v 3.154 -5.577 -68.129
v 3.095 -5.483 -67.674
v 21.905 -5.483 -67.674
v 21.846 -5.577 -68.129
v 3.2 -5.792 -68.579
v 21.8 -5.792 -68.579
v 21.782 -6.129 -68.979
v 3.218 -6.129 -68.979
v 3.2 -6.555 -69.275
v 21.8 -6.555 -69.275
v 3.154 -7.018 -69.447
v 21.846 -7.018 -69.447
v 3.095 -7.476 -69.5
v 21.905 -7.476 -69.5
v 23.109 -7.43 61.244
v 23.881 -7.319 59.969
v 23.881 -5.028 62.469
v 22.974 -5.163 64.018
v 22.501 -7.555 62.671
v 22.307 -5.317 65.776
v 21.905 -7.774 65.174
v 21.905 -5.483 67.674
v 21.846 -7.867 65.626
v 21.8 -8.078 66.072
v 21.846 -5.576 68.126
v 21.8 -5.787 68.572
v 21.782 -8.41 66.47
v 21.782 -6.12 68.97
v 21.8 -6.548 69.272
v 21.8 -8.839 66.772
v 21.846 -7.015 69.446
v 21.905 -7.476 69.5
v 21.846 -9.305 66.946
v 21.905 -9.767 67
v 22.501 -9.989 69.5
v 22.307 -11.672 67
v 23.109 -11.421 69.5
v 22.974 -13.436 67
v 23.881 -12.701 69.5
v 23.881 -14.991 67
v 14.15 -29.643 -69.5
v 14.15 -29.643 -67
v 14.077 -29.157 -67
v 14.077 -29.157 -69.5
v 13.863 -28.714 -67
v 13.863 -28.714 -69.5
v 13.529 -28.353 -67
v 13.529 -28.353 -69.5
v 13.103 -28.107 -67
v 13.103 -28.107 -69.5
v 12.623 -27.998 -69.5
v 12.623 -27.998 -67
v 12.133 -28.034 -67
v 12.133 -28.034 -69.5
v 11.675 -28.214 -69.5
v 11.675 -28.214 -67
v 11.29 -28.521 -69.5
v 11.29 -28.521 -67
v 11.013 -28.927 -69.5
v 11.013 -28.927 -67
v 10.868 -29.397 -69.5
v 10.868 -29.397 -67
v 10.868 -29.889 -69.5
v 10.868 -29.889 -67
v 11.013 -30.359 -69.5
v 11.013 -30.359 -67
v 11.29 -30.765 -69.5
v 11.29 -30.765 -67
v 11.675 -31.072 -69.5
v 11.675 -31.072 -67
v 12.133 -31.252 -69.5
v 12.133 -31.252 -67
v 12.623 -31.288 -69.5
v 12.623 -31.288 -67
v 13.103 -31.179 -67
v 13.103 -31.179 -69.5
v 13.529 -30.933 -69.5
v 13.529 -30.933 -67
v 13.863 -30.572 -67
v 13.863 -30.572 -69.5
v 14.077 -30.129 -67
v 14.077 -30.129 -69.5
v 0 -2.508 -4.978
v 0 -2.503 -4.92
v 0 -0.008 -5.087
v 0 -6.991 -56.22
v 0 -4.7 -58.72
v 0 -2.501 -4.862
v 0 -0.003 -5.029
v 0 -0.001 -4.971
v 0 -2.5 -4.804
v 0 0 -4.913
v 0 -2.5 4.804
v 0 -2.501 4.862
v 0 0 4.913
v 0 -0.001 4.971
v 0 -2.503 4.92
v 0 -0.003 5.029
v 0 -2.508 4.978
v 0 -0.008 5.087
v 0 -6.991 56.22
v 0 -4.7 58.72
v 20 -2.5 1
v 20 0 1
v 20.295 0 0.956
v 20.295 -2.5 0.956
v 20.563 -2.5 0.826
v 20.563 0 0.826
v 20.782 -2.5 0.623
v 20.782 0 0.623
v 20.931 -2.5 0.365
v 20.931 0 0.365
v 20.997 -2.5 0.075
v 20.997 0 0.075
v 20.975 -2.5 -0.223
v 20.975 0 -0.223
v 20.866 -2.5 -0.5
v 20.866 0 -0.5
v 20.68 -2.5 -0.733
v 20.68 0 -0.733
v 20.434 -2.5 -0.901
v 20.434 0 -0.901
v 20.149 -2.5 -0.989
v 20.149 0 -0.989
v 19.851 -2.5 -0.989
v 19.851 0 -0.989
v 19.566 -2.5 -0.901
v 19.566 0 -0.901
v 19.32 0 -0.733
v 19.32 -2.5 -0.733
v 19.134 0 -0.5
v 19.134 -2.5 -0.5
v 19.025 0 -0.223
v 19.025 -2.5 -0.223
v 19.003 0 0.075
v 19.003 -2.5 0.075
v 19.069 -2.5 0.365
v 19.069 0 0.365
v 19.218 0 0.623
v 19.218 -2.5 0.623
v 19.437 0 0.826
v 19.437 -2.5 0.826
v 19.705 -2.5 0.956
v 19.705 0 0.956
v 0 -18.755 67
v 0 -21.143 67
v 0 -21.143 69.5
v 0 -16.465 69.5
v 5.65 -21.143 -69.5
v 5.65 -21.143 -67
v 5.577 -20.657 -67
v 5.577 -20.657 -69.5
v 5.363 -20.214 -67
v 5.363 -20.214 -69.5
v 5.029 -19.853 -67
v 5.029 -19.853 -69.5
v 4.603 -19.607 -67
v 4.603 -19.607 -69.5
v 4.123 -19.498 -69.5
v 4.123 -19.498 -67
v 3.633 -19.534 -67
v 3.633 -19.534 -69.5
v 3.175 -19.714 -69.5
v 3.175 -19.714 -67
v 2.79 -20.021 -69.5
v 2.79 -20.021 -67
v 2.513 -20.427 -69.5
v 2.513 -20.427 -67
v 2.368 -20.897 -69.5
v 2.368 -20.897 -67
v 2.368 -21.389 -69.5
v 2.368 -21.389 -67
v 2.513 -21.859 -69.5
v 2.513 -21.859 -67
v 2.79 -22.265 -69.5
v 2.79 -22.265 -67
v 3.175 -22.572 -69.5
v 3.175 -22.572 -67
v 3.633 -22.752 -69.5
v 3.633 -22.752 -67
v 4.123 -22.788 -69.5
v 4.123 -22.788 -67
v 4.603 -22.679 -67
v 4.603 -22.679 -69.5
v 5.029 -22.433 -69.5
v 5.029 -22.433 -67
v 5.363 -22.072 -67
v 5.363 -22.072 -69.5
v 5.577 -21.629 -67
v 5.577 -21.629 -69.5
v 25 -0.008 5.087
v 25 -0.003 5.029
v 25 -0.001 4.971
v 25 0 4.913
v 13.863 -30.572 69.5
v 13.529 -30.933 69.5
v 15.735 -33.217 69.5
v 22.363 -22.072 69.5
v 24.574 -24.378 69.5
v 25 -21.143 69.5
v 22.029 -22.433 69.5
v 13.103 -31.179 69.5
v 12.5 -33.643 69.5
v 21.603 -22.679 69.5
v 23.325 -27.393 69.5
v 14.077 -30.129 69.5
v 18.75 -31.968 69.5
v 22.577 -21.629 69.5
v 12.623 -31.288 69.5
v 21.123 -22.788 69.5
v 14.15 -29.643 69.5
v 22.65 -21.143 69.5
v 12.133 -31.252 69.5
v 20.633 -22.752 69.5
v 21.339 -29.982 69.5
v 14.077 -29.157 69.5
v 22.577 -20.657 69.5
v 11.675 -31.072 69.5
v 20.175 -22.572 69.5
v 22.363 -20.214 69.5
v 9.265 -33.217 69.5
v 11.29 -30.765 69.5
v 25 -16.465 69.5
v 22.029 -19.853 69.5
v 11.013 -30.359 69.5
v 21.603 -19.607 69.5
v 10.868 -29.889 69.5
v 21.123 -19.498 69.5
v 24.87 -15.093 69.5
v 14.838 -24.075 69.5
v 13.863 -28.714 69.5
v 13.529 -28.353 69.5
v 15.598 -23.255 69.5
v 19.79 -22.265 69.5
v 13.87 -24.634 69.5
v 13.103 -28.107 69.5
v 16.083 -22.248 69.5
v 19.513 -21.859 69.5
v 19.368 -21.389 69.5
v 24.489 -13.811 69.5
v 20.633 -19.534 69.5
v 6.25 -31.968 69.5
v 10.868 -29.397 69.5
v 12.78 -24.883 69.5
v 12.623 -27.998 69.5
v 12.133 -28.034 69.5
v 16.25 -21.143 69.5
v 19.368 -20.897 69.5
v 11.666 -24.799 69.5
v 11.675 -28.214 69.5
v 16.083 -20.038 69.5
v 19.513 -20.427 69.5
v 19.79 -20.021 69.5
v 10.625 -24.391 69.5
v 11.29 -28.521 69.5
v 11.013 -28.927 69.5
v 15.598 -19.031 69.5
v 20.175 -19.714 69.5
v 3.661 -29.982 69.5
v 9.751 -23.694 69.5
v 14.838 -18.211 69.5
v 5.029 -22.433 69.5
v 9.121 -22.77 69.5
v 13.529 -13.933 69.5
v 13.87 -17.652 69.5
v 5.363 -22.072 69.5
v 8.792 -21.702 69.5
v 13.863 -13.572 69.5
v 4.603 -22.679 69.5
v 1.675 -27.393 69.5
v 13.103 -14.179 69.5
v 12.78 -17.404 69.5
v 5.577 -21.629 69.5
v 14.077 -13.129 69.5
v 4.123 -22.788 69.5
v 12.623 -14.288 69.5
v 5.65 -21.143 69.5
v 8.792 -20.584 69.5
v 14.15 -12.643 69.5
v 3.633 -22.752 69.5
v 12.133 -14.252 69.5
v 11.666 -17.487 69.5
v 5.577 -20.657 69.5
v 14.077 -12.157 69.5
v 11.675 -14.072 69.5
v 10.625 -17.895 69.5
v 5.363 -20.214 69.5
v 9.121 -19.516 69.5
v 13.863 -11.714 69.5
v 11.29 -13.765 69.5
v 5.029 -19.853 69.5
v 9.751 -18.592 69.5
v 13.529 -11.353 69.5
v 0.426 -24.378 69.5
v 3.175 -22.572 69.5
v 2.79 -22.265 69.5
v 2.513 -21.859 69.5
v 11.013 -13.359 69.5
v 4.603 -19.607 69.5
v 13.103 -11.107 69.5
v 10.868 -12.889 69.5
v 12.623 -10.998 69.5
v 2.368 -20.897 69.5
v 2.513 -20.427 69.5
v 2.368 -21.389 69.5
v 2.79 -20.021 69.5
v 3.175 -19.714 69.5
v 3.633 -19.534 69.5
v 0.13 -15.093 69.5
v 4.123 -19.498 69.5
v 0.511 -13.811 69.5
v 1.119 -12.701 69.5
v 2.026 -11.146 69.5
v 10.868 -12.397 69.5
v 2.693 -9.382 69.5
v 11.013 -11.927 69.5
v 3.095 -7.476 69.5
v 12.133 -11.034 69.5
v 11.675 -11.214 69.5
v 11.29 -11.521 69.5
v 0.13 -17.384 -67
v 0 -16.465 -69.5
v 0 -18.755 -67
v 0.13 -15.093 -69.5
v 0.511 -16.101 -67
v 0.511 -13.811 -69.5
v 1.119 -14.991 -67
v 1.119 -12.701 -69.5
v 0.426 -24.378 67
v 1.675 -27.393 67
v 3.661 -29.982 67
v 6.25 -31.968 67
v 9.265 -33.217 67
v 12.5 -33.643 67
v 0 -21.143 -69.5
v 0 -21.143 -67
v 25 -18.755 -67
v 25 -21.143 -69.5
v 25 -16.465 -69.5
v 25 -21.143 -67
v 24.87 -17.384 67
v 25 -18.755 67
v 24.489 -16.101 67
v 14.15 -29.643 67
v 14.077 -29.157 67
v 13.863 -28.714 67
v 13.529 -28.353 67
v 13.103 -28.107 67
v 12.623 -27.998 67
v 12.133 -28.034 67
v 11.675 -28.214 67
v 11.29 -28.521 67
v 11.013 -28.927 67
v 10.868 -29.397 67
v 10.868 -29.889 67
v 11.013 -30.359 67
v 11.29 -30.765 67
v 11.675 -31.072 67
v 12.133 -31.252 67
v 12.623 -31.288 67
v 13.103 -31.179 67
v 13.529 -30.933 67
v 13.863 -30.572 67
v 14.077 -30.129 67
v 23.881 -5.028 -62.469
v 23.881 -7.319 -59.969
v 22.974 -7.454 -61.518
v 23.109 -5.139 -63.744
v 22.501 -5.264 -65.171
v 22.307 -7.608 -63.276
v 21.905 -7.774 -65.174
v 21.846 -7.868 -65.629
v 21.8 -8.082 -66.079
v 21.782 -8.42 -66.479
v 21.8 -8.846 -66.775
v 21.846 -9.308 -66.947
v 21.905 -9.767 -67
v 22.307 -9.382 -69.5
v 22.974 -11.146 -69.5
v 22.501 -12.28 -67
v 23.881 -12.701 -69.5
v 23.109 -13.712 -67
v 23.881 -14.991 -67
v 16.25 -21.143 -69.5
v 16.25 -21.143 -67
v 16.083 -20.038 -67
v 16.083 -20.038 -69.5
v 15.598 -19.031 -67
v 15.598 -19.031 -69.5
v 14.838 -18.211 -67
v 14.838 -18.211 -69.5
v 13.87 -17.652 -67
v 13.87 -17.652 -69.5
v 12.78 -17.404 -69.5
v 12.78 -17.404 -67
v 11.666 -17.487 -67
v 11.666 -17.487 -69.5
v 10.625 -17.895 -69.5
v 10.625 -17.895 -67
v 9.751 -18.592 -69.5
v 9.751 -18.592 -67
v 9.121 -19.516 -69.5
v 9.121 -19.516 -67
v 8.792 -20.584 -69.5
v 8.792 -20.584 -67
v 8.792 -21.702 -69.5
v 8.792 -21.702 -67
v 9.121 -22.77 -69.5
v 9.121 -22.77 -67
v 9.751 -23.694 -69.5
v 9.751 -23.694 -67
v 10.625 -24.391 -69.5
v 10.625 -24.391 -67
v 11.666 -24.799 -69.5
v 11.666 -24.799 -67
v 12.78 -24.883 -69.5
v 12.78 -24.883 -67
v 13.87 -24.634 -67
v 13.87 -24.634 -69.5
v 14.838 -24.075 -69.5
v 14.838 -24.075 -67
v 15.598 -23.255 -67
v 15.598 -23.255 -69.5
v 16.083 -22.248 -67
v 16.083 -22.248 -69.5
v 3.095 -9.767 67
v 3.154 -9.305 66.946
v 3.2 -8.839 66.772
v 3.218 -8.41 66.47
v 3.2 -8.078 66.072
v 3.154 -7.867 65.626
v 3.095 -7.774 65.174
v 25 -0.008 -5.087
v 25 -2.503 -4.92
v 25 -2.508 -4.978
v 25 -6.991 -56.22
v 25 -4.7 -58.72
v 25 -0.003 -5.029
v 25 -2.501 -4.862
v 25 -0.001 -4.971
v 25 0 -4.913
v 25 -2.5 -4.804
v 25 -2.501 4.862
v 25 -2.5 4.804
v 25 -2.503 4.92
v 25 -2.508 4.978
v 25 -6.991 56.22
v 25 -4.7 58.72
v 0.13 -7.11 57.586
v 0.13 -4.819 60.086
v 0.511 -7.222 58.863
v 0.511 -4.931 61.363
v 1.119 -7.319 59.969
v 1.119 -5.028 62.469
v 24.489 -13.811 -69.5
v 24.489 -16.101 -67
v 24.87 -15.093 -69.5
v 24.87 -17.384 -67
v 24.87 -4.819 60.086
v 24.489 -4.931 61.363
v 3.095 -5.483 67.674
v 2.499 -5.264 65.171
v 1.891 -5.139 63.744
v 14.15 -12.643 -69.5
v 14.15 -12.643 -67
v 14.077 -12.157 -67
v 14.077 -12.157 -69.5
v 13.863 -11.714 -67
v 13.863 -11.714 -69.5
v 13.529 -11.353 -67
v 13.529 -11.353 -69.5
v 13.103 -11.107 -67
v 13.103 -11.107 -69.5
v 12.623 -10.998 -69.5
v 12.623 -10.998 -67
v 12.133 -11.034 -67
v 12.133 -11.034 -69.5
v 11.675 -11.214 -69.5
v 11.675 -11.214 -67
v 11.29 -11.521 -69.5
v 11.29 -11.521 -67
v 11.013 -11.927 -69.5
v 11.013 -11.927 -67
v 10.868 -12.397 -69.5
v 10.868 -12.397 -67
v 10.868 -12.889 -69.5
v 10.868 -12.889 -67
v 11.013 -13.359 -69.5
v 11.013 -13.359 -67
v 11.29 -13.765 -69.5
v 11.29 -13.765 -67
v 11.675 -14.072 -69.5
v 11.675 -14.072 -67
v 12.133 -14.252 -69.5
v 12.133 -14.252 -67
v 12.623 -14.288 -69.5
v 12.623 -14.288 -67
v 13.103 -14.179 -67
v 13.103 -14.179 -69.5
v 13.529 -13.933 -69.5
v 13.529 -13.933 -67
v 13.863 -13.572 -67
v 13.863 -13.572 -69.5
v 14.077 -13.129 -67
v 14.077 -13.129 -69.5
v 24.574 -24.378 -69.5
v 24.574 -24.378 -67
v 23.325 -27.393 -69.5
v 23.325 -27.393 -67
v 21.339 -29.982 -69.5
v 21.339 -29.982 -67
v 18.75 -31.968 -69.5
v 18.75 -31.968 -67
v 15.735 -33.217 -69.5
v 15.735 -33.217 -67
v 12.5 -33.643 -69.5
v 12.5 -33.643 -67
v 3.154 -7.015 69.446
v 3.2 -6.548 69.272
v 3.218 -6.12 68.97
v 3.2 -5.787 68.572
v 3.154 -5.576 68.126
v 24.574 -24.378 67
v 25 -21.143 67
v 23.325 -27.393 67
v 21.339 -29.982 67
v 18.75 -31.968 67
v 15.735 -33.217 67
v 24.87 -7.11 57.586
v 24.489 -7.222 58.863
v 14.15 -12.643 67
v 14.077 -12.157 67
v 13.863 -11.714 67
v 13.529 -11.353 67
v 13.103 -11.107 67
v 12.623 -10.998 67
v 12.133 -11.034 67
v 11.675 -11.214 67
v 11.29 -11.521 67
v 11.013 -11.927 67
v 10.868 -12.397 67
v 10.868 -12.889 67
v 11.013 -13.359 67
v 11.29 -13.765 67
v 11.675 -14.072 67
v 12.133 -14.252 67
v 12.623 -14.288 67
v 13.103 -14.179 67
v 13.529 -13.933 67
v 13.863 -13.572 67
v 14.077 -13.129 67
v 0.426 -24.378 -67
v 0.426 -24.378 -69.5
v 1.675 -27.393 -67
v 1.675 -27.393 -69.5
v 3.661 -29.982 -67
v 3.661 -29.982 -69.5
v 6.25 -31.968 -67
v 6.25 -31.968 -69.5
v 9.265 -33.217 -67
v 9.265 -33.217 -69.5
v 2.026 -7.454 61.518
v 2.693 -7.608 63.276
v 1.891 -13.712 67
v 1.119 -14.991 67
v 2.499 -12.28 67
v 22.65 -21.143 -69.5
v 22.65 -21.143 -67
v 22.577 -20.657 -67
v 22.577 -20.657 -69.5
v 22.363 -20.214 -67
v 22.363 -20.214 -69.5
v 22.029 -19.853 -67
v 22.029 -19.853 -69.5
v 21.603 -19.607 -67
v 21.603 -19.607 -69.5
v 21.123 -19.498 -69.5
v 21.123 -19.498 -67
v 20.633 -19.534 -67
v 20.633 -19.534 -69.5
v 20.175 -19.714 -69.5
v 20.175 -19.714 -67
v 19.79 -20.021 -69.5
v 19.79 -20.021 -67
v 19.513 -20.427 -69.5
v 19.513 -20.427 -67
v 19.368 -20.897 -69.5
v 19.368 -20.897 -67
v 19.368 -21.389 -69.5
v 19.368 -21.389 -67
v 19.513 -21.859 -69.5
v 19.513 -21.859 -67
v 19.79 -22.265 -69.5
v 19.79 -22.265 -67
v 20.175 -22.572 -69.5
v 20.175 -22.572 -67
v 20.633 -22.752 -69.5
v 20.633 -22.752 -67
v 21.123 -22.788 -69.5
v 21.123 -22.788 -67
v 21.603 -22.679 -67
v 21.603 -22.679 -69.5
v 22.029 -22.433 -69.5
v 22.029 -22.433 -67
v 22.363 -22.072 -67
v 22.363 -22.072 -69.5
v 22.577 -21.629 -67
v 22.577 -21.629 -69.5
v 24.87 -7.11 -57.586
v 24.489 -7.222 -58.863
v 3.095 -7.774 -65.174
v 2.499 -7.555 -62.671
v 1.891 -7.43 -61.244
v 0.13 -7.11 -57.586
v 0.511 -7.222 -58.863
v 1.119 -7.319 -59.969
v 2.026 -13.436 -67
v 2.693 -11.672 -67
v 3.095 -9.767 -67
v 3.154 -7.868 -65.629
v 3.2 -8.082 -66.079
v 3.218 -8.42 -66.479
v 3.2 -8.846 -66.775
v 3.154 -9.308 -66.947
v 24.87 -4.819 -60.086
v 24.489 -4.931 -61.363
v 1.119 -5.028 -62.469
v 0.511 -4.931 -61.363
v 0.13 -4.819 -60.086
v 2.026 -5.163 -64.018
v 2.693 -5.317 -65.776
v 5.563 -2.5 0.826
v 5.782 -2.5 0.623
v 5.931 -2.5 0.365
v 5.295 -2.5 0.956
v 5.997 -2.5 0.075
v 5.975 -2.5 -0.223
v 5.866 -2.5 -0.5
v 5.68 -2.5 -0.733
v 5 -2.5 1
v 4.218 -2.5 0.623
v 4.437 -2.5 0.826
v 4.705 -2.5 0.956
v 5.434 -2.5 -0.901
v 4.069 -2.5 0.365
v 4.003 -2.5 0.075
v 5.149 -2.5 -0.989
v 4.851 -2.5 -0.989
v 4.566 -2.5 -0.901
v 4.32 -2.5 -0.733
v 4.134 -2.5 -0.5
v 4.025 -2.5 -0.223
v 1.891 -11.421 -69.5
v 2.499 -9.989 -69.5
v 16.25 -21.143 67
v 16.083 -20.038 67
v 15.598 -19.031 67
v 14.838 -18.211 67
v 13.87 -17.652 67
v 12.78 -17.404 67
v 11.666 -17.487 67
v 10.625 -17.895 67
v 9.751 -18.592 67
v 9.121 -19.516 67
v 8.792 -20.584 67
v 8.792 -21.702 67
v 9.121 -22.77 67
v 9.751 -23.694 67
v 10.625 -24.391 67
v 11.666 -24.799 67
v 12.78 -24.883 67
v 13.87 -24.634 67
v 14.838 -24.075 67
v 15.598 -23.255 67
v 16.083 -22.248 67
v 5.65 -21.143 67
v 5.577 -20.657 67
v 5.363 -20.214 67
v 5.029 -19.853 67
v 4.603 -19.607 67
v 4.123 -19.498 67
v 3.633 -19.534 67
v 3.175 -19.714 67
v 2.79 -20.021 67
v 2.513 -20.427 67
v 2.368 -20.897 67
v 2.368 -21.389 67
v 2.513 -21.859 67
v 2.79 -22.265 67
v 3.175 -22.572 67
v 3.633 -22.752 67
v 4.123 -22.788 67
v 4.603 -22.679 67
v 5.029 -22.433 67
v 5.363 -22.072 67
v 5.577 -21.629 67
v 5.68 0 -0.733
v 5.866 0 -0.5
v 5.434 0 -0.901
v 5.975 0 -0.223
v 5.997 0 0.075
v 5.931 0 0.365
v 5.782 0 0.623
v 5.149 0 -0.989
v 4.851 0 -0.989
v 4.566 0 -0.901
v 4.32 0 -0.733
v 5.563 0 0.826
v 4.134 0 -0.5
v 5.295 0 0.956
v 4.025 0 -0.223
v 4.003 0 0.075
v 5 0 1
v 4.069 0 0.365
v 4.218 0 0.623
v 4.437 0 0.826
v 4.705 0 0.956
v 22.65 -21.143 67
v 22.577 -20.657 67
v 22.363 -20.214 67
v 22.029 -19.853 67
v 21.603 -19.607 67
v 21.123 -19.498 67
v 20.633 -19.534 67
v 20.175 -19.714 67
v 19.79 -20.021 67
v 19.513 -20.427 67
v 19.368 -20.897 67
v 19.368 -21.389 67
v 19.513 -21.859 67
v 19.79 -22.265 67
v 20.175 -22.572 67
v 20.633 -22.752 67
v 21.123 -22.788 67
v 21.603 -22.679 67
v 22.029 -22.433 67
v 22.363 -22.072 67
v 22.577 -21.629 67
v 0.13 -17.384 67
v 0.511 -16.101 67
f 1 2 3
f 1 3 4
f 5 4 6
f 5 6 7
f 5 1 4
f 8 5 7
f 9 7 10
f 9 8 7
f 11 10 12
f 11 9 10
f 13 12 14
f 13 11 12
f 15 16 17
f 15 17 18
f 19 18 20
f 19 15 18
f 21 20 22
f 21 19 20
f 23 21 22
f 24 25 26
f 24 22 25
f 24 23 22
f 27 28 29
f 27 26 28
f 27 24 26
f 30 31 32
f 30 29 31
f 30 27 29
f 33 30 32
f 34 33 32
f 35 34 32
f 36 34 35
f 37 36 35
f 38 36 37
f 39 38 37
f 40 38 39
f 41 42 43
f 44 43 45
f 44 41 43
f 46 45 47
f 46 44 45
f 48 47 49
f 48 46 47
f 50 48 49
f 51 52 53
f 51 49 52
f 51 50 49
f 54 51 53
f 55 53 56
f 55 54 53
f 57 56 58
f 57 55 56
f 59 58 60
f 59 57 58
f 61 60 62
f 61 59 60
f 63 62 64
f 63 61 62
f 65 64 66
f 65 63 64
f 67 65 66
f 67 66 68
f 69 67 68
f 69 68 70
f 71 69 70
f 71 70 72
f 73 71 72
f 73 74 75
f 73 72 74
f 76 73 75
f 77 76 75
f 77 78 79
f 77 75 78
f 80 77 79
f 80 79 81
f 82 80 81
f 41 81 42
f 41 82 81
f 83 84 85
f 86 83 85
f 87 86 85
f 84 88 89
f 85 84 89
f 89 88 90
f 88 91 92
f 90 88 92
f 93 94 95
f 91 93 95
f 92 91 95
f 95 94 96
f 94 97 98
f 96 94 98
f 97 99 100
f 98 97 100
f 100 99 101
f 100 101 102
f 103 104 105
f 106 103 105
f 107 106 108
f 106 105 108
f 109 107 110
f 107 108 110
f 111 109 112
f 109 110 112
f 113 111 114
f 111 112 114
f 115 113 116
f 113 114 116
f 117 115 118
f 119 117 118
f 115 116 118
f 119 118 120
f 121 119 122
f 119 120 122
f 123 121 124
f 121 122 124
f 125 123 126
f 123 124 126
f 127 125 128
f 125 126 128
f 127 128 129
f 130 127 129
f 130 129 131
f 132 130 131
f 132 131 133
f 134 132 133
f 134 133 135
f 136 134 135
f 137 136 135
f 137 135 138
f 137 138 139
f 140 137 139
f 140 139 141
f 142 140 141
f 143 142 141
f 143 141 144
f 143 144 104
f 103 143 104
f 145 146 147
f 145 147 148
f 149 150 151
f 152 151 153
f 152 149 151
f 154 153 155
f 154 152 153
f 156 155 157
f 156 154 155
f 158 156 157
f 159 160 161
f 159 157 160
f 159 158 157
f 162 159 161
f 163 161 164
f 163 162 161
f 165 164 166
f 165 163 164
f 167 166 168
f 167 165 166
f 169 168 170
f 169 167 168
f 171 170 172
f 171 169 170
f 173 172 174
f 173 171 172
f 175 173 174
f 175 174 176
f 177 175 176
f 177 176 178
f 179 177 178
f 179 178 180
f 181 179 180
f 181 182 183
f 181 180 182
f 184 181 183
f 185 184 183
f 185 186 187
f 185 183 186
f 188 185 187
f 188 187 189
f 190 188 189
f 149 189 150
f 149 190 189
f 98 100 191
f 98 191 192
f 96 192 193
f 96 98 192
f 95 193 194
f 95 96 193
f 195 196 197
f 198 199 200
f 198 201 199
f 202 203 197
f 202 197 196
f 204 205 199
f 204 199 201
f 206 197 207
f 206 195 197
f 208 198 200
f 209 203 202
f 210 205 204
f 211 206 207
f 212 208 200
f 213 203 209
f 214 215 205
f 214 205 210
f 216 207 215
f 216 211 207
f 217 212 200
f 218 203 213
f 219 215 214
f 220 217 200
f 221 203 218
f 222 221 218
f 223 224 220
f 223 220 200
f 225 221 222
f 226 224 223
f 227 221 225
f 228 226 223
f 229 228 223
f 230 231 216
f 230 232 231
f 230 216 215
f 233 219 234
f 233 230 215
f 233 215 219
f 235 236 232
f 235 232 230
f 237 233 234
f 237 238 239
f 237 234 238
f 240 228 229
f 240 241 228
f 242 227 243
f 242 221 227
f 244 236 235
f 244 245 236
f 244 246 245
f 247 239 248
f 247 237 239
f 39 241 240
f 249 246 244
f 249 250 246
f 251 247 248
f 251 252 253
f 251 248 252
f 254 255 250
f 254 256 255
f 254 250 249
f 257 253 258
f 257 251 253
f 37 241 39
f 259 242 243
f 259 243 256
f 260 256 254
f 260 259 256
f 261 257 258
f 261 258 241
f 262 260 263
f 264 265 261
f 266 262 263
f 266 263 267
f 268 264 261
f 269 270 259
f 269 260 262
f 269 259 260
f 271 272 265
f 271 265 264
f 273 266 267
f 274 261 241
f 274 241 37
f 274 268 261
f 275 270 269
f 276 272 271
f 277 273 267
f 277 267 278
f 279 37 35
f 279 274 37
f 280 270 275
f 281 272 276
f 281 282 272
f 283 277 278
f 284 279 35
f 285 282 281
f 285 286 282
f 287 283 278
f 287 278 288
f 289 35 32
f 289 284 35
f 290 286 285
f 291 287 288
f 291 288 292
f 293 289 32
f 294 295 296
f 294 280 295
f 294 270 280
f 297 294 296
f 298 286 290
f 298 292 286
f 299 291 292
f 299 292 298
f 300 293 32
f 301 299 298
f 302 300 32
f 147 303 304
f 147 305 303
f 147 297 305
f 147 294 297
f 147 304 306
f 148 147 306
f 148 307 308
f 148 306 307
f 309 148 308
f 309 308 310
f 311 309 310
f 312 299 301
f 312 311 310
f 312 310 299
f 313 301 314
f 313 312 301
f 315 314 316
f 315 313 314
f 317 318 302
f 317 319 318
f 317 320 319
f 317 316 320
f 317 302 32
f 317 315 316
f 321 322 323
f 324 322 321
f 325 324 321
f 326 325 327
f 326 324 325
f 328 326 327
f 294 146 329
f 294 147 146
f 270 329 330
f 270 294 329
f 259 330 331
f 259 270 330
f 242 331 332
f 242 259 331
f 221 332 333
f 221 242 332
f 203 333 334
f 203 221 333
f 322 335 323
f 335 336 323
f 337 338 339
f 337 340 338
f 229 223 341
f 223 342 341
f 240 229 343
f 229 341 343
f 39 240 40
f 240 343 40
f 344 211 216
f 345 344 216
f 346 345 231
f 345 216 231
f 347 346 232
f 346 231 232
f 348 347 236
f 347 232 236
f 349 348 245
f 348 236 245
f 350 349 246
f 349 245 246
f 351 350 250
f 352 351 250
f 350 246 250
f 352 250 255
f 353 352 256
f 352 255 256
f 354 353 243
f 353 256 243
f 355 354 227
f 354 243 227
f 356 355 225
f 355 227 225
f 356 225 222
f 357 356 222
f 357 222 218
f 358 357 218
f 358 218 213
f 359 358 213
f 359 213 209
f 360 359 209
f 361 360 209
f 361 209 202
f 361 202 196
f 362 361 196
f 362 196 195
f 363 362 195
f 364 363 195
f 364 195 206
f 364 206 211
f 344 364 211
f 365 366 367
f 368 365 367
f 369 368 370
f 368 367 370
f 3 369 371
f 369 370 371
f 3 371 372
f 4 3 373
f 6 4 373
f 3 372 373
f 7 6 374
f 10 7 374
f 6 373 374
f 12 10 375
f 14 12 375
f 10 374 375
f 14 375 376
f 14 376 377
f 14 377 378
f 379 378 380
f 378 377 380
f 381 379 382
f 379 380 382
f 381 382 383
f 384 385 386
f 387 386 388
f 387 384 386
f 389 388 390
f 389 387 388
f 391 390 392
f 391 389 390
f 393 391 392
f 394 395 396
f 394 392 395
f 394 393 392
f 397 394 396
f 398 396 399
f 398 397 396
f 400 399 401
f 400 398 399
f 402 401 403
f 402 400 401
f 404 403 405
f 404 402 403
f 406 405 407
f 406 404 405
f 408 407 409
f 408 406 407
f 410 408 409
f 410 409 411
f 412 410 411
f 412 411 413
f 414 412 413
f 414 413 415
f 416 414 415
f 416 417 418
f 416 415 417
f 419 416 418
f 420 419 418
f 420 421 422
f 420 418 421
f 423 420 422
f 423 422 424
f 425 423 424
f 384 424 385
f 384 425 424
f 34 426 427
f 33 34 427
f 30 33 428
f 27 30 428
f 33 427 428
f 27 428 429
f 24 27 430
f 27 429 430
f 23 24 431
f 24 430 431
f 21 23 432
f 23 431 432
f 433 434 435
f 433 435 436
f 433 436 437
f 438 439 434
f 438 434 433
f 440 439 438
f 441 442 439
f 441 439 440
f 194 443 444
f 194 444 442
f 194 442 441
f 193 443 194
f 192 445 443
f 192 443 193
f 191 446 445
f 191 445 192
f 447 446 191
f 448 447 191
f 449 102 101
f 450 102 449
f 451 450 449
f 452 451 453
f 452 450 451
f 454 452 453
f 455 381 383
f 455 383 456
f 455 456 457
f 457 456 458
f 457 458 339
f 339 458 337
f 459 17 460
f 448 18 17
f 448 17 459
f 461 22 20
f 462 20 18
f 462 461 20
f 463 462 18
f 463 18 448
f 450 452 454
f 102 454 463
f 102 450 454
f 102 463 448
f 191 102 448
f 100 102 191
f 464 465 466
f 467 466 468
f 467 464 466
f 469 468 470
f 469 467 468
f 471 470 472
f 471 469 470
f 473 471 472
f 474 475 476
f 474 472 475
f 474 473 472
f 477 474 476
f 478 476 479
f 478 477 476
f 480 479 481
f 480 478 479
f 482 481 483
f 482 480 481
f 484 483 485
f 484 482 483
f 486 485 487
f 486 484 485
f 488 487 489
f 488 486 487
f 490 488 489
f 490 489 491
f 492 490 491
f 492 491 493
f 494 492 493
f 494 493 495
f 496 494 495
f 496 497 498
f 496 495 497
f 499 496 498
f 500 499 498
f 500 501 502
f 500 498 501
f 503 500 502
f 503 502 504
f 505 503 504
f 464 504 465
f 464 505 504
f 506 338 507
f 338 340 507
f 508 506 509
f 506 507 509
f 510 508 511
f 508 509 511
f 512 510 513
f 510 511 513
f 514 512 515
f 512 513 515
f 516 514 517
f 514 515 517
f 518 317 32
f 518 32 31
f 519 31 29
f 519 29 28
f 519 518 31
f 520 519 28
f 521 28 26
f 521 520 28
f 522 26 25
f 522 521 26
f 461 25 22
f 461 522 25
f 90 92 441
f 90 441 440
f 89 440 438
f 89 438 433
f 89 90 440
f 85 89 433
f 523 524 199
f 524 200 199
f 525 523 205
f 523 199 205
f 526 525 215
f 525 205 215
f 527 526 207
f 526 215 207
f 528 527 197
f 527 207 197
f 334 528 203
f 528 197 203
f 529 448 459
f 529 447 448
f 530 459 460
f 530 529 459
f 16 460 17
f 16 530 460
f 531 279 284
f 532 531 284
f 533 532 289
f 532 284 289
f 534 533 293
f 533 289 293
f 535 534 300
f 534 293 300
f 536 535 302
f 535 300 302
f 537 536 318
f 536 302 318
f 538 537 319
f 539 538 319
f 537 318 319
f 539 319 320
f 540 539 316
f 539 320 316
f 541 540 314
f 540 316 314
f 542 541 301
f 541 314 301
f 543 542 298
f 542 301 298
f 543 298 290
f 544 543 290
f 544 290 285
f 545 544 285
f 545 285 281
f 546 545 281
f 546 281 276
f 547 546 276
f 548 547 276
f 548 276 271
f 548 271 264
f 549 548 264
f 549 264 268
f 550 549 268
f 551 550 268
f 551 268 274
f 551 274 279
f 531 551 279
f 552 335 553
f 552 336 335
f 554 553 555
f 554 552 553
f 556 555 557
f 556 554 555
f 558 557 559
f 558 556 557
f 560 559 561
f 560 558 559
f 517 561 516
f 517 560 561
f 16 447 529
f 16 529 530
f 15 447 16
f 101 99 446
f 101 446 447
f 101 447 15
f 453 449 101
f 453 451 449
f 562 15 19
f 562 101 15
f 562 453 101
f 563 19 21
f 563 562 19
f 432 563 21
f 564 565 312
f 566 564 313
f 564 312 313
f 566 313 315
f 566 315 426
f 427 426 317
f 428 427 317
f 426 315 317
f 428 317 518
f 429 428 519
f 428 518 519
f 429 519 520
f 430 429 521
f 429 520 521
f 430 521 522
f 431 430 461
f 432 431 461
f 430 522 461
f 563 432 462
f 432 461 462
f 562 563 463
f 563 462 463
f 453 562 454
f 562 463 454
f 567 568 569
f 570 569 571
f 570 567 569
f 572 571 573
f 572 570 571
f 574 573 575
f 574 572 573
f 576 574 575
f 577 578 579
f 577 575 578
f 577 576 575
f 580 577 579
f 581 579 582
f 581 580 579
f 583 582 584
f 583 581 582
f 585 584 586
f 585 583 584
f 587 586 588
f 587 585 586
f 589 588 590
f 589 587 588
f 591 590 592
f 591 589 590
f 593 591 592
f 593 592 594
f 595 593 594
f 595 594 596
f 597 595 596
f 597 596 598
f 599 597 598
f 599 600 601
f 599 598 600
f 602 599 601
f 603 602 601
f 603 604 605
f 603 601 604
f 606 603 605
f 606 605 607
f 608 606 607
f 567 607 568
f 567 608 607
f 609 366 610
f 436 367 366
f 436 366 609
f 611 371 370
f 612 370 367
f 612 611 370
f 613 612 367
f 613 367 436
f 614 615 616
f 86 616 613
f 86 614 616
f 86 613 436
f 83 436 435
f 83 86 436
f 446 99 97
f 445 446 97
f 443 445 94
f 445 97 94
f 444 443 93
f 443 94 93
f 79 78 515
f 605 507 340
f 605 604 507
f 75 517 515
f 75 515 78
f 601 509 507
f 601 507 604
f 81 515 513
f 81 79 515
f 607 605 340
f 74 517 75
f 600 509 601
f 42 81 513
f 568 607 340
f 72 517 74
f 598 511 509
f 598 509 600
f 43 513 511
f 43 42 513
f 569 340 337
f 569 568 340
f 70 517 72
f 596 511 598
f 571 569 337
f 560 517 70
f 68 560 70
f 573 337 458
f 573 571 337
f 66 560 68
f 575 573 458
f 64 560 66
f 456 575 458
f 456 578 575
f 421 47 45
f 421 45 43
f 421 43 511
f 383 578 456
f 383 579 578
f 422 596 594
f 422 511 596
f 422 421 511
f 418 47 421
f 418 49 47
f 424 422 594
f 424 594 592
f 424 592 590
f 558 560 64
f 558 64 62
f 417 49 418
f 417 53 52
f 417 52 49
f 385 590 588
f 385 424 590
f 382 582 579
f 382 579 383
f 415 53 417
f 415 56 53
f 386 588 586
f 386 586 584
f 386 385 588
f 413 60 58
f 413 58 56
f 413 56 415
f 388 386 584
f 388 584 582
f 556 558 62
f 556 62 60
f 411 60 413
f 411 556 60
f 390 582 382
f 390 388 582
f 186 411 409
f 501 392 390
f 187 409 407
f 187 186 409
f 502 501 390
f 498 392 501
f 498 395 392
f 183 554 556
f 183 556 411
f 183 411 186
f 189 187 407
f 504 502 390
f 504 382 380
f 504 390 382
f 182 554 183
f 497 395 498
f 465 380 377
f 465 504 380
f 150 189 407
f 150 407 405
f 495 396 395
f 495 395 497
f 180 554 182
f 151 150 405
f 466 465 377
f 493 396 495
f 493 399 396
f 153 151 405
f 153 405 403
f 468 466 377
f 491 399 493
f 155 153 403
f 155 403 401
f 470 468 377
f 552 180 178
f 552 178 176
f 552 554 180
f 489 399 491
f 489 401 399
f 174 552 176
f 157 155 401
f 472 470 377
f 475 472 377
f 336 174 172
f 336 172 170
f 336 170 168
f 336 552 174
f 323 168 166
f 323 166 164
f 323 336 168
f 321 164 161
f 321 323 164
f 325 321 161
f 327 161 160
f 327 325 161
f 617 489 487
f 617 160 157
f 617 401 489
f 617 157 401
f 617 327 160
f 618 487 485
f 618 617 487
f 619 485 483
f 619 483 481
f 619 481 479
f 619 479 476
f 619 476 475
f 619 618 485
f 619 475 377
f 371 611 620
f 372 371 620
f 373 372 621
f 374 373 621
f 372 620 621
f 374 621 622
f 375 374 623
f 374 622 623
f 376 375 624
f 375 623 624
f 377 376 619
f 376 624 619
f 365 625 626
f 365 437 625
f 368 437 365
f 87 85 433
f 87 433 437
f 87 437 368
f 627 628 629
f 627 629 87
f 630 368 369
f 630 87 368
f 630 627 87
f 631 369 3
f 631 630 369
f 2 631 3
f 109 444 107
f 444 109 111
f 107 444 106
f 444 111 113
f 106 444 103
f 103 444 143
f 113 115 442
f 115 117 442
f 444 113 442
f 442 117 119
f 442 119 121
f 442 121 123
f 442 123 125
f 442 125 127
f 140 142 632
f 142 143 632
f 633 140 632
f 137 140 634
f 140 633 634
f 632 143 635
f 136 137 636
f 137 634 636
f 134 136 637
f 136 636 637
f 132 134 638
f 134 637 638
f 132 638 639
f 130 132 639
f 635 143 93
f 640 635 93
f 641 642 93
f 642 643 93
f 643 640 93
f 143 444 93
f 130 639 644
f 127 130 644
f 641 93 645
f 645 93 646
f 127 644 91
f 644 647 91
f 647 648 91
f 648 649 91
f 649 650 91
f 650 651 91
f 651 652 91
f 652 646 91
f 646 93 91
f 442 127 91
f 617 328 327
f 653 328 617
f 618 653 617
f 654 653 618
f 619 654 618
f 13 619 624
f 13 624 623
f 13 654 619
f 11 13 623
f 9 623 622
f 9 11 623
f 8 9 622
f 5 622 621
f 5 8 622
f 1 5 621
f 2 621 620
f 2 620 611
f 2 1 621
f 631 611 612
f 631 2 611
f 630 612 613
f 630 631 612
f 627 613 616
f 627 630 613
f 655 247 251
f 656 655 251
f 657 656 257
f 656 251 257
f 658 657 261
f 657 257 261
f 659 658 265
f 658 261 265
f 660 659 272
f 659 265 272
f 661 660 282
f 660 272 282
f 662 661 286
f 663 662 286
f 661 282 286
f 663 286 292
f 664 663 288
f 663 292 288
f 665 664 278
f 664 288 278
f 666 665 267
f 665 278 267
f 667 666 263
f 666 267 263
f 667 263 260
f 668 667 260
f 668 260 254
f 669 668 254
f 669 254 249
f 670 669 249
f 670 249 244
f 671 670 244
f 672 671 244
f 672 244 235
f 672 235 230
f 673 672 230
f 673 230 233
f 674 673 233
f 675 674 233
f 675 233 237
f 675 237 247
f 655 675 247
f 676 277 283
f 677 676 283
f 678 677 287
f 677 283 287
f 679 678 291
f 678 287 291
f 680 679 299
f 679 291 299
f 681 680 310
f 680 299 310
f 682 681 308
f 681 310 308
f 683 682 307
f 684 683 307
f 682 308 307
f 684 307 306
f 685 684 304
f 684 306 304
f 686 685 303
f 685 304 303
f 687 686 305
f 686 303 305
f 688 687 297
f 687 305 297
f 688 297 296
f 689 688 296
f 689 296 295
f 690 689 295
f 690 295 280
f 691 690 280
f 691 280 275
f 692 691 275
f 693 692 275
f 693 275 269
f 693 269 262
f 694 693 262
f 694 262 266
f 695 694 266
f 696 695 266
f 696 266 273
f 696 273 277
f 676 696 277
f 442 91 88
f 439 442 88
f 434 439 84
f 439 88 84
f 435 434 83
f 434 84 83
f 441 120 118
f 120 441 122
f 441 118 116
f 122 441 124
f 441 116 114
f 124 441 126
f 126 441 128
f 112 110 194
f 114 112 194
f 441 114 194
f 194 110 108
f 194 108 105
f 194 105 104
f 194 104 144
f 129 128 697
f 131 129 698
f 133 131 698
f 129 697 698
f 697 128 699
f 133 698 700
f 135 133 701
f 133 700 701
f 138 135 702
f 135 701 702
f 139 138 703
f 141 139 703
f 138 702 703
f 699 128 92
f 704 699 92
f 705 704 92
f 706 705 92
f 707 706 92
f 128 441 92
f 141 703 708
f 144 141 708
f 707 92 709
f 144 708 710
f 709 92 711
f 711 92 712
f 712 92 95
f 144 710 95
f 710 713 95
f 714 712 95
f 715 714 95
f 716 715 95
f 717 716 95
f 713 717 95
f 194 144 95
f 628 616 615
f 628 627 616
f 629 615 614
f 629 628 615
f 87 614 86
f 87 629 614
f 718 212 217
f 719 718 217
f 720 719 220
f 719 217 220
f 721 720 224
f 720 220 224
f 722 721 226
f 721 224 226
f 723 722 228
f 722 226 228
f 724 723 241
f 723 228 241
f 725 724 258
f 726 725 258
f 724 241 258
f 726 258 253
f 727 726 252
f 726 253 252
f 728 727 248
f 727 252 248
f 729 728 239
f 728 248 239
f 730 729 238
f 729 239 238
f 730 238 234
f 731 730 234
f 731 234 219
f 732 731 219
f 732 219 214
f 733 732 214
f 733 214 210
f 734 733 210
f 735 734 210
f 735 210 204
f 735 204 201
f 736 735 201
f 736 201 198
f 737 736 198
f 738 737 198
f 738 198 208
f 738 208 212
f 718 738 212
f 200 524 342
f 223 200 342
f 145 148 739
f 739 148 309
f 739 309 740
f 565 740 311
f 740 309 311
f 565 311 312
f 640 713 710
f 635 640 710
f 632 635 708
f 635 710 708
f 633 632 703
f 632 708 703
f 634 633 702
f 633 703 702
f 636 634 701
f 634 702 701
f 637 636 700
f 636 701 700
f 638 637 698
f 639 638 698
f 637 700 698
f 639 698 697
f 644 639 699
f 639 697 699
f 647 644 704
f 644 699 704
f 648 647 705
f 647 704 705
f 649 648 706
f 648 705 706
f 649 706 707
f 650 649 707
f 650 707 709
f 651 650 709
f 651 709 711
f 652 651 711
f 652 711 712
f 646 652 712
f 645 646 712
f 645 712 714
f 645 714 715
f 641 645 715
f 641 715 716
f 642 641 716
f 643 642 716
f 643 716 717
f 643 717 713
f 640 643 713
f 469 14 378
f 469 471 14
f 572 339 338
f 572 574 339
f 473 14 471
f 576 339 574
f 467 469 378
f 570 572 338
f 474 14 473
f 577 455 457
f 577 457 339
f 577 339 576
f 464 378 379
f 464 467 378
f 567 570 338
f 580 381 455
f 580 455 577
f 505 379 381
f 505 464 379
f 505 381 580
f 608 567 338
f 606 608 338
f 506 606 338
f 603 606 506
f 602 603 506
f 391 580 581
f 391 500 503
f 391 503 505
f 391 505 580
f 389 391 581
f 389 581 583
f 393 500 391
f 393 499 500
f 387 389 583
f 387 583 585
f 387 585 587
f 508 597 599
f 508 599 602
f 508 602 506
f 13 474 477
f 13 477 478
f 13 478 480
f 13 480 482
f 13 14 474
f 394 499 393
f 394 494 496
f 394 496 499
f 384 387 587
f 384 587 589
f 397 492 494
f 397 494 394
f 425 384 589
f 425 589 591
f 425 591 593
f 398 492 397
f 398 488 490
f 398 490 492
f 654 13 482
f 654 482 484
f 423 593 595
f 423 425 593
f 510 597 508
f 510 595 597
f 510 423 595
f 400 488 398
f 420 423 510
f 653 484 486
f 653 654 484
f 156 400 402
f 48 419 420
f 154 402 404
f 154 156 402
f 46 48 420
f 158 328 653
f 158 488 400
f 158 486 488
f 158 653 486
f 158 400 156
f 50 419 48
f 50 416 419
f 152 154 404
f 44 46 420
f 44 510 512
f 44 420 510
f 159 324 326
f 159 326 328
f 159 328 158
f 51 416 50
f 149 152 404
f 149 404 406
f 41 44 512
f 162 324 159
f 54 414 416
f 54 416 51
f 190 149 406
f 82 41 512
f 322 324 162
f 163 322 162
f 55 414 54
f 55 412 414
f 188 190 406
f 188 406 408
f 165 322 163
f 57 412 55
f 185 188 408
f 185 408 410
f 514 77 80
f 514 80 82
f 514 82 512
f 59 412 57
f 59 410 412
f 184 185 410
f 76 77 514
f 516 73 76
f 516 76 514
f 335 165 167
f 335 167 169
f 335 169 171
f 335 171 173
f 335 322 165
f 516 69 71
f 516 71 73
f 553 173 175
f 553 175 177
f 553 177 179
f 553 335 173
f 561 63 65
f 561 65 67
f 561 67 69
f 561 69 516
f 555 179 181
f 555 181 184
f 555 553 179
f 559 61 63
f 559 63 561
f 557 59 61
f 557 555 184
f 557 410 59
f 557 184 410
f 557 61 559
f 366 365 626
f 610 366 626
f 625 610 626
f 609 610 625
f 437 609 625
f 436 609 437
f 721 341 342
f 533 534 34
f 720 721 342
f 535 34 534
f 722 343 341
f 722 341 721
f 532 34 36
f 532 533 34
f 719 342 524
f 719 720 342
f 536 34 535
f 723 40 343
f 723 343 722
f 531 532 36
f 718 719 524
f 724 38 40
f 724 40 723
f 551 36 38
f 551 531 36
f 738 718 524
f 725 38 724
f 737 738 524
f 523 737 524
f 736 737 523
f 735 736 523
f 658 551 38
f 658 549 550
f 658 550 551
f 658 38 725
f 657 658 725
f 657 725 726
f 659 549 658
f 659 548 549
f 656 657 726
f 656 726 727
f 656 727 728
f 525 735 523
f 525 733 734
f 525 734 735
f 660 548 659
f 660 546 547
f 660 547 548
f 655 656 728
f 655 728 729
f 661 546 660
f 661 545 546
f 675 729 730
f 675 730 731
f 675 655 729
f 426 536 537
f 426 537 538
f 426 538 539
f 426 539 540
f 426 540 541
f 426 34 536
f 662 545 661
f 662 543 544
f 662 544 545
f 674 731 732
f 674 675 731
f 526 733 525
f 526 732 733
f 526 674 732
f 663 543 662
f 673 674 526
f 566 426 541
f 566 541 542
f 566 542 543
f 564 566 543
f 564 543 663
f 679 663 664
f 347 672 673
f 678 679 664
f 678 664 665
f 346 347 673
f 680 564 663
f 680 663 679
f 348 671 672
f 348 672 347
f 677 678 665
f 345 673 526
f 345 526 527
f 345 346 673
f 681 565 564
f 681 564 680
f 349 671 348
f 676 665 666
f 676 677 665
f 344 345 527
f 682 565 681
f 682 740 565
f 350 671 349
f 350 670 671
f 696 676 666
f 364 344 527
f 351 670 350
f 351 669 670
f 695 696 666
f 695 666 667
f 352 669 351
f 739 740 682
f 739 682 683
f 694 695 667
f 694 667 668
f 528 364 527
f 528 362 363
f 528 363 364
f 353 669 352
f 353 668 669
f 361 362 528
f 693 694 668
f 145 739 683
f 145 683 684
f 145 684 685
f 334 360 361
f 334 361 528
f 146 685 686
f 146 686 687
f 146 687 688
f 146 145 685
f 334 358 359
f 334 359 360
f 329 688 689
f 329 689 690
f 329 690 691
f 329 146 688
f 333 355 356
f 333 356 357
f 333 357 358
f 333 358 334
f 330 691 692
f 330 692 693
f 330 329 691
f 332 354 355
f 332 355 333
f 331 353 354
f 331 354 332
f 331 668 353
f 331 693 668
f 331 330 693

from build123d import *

# Parameters (mm, degrees)
RESSALTO_EXTRUS_O2_DEPTH = 25
ESBO_O9_R                = 3.75
ESBO_O9_R_2              = 1.65
CORTE_EXTRUS_O1_DEPTH    = 20
FILETE1_R                = 12.5
FILETE2_START            = -1
FILETE2_DEPTH            = 27
FILETE2_2_DEPTH          = 25
ESBO_O10_R               = 1
CORTE_EXTRUS_O2_DEPTH    = 82.160967921
ESBO_O11_R               = 7.5
CORTE_EXTRUS_O3_DEPTH    = 10
FILETE3_R                = 4


with BuildPart() as part:
    # Esboço2 → Ressalto-extrusão2 (new body)
    with BuildSketch(Plane(origin=(0, 0, 0), x_dir=(0, 0, -1), z_dir=(1, 0, 0))):
        Polygon((-5, 0), (0, 0), (5, 0), (69.5, -5.643018797), (69.5, -33.643018797), (67, -33.643018797), (67, -7.933846732), (4.890847643, -2.5), (0, -2.5), (-4.890847643, -2.5), (-67, -7.933846732), (-67, -33.643018797), (-69.5, -33.643018797), (-69.5, -5.643018797), align=None)
    extrude(amount=RESSALTO_EXTRUS_O2_DEPTH)

    # Esboço9 → Corte-extrusão1 (cut)
    with BuildSketch(Plane.XY.offset(69.5)):
        with Locations((12.5, -21.143018797)):
            Circle(ESBO_O9_R)
        with Locations((12.5, -12.643018797)):
            Circle(ESBO_O9_R_2)
        with Locations((21, -21.143018797)):
            Circle(ESBO_O9_R_2)
        with Locations((12.5, -29.643018797)):
            Circle(ESBO_O9_R_2)
        with Locations((4, -21.143018797)):
            Circle(ESBO_O9_R_2)
    corte_extrus_o1 = extrude(amount=-CORTE_EXTRUS_O1_DEPTH, mode=Mode.SUBTRACT)

    # Espelhar1: Corte-extrusão1 across plane
    add(corte_extrus_o1.mirror(Plane.XY), mode=Mode.SUBTRACT)

    # Filete1
    filete1_edges = [part.edges().sort_by_distance(p)[0] for p in [
        (0, -33.643018797, 68.25),
        (25, -33.643018797, 68.25),
        (25, -33.643018797, -68.25),
        (0, -33.643018797, -68.25),
    ]]
    fillet(filete1_edges, radius=FILETE1_R - 0.0001)  # a hair under: the kernel refuses the full size

    # Filete2: read off the stored shape, not the designer's step
    # Filete2 outline → Filete2 (cut)
    with BuildSketch(Plane.YZ.offset(FILETE2_START)):
        with BuildLine():
            Line((0, -5), (0, -4.912678114))
            ThreePointArc((0, -4.912678114), (-0.001903557, -4.999916889), (-0.007610604, -5.0869896))
            Line((-0.007610604, -5.0869896), (0, -5))
        make_face()
        with BuildLine():
            ThreePointArc((-7.475681145, 69.5), (-6.12450073, 68.974554674), (-5.483291749, 67.674311485))
            Line((-5.483291749, 67.674311485), (-5.643018797, 69.5))
            Line((-5.643018797, 69.5), (-7.475681145, 69.5))
        make_face()
        with BuildLine():
            ThreePointArc((-0.007610604, 5.0869896), (-0.001903557, 4.999916889), (0, 4.912678114))
            Line((0, 4.912678114), (0, 5))
            Line((0, 5), (-0.007610604, 5.0869896))
        make_face()
        with BuildLine():
            Line((-5.643018797, -69.5), (-5.483291749, -67.674311485))
            ThreePointArc((-5.483291749, -67.674311485), (-6.12450073, -68.974554674), (-7.475681145, -69.5))
            Line((-7.475681145, -69.5), (-5.643018797, -69.5))
        make_face()
    extrude(amount=FILETE2_DEPTH, mode=Mode.SUBTRACT)

    # Filete2 2 outline → Filete2 2 (add)
    with BuildSketch(Plane.YZ):
        with BuildLine():
            ThreePointArc((-9.766509081, 67), (-8.415328665, 66.474554674), (-7.774119684, 65.174311485))
            Line((-7.774119684, 65.174311485), (-7.933846732, 67))
            Line((-7.933846732, 67), (-9.766509081, 67))
        make_face()
        with BuildLine():
            ThreePointArc((-2.507610604, 4.977837242), (-2.501903557, 4.890764531), (-2.5, 4.803525757))
            Line((-2.5, 4.803525757), (-2.5, 4.890847643))
            Line((-2.5, 4.890847643), (-2.507610604, 4.977837242))
        make_face()
        with BuildLine():
            Line((-7.933846732, -67), (-7.774119684, -65.174311485))
            ThreePointArc((-7.774119684, -65.174311485), (-8.415328665, -66.474554674), (-9.766509081, -67))
            Line((-9.766509081, -67), (-7.933846732, -67))
        make_face()
        with BuildLine():
            ThreePointArc((-2.5, -4.803525757), (-2.501903557, -4.890764531), (-2.507610604, -4.977837242))
            Line((-2.507610604, -4.977837242), (-2.5, -4.890847643))
            Line((-2.5, -4.890847643), (-2.5, -4.803525757))
        make_face()
    extrude(amount=FILETE2_2_DEPTH)

    # Esboço10 → Corte-extrusão2 (cut, through all)
    with BuildSketch(Plane(origin=(0, 0, 0), x_dir=(1, 0, 0), z_dir=(0, 1, 0))):
        with Locations(Location((5, 0, 0), (0, 0, 270))):
            Circle(ESBO_O10_R)
        with Locations(Location((20, 0, 0), (0, 0, 270))):
            Circle(ESBO_O10_R)
    extrude(amount=-CORTE_EXTRUS_O2_DEPTH, mode=Mode.SUBTRACT)

    # Esboço11 → Corte-extrusão3 (cut, symmetric)
    with BuildSketch(Plane(origin=(0, 31.205699457, -34.0550451), x_dir=(1, 0, 0), z_dir=(0, -0.6755902076156625, 0.7372773368101221))):
        with Locations((-4.282064203, -51.1139893)):
            Circle(ESBO_O11_R)
        with Locations((29.282064203, -51.1139893)):
            Circle(ESBO_O11_R)
    corte_extrus_o3 = extrude(amount=CORTE_EXTRUS_O3_DEPTH, both=True, mode=Mode.SUBTRACT)

    # Espelhar2: Corte-extrusão3 across plane
    add(corte_extrus_o3.mirror(Plane.XY), mode=Mode.SUBTRACT)

    # Filete3
    filete3_edges = [part.edges().sort_by_distance(p)[0] for p in [
        (25, -15.140009882, -68.25),
        (25, -6.060544858, -59.930203155),
        (0, -6.060544858, -59.930203155),
        (0, -15.140009882, -68.25),
        (0, -15.140009882, 68.25),
        (0, -6.060544858, 59.930203155),
        (25, -15.140009882, 68.25),
        (25, -6.060544858, 59.930203155),
    ]]
    fillet(filete3_edges, radius=FILETE3_R)


solid = part.part
